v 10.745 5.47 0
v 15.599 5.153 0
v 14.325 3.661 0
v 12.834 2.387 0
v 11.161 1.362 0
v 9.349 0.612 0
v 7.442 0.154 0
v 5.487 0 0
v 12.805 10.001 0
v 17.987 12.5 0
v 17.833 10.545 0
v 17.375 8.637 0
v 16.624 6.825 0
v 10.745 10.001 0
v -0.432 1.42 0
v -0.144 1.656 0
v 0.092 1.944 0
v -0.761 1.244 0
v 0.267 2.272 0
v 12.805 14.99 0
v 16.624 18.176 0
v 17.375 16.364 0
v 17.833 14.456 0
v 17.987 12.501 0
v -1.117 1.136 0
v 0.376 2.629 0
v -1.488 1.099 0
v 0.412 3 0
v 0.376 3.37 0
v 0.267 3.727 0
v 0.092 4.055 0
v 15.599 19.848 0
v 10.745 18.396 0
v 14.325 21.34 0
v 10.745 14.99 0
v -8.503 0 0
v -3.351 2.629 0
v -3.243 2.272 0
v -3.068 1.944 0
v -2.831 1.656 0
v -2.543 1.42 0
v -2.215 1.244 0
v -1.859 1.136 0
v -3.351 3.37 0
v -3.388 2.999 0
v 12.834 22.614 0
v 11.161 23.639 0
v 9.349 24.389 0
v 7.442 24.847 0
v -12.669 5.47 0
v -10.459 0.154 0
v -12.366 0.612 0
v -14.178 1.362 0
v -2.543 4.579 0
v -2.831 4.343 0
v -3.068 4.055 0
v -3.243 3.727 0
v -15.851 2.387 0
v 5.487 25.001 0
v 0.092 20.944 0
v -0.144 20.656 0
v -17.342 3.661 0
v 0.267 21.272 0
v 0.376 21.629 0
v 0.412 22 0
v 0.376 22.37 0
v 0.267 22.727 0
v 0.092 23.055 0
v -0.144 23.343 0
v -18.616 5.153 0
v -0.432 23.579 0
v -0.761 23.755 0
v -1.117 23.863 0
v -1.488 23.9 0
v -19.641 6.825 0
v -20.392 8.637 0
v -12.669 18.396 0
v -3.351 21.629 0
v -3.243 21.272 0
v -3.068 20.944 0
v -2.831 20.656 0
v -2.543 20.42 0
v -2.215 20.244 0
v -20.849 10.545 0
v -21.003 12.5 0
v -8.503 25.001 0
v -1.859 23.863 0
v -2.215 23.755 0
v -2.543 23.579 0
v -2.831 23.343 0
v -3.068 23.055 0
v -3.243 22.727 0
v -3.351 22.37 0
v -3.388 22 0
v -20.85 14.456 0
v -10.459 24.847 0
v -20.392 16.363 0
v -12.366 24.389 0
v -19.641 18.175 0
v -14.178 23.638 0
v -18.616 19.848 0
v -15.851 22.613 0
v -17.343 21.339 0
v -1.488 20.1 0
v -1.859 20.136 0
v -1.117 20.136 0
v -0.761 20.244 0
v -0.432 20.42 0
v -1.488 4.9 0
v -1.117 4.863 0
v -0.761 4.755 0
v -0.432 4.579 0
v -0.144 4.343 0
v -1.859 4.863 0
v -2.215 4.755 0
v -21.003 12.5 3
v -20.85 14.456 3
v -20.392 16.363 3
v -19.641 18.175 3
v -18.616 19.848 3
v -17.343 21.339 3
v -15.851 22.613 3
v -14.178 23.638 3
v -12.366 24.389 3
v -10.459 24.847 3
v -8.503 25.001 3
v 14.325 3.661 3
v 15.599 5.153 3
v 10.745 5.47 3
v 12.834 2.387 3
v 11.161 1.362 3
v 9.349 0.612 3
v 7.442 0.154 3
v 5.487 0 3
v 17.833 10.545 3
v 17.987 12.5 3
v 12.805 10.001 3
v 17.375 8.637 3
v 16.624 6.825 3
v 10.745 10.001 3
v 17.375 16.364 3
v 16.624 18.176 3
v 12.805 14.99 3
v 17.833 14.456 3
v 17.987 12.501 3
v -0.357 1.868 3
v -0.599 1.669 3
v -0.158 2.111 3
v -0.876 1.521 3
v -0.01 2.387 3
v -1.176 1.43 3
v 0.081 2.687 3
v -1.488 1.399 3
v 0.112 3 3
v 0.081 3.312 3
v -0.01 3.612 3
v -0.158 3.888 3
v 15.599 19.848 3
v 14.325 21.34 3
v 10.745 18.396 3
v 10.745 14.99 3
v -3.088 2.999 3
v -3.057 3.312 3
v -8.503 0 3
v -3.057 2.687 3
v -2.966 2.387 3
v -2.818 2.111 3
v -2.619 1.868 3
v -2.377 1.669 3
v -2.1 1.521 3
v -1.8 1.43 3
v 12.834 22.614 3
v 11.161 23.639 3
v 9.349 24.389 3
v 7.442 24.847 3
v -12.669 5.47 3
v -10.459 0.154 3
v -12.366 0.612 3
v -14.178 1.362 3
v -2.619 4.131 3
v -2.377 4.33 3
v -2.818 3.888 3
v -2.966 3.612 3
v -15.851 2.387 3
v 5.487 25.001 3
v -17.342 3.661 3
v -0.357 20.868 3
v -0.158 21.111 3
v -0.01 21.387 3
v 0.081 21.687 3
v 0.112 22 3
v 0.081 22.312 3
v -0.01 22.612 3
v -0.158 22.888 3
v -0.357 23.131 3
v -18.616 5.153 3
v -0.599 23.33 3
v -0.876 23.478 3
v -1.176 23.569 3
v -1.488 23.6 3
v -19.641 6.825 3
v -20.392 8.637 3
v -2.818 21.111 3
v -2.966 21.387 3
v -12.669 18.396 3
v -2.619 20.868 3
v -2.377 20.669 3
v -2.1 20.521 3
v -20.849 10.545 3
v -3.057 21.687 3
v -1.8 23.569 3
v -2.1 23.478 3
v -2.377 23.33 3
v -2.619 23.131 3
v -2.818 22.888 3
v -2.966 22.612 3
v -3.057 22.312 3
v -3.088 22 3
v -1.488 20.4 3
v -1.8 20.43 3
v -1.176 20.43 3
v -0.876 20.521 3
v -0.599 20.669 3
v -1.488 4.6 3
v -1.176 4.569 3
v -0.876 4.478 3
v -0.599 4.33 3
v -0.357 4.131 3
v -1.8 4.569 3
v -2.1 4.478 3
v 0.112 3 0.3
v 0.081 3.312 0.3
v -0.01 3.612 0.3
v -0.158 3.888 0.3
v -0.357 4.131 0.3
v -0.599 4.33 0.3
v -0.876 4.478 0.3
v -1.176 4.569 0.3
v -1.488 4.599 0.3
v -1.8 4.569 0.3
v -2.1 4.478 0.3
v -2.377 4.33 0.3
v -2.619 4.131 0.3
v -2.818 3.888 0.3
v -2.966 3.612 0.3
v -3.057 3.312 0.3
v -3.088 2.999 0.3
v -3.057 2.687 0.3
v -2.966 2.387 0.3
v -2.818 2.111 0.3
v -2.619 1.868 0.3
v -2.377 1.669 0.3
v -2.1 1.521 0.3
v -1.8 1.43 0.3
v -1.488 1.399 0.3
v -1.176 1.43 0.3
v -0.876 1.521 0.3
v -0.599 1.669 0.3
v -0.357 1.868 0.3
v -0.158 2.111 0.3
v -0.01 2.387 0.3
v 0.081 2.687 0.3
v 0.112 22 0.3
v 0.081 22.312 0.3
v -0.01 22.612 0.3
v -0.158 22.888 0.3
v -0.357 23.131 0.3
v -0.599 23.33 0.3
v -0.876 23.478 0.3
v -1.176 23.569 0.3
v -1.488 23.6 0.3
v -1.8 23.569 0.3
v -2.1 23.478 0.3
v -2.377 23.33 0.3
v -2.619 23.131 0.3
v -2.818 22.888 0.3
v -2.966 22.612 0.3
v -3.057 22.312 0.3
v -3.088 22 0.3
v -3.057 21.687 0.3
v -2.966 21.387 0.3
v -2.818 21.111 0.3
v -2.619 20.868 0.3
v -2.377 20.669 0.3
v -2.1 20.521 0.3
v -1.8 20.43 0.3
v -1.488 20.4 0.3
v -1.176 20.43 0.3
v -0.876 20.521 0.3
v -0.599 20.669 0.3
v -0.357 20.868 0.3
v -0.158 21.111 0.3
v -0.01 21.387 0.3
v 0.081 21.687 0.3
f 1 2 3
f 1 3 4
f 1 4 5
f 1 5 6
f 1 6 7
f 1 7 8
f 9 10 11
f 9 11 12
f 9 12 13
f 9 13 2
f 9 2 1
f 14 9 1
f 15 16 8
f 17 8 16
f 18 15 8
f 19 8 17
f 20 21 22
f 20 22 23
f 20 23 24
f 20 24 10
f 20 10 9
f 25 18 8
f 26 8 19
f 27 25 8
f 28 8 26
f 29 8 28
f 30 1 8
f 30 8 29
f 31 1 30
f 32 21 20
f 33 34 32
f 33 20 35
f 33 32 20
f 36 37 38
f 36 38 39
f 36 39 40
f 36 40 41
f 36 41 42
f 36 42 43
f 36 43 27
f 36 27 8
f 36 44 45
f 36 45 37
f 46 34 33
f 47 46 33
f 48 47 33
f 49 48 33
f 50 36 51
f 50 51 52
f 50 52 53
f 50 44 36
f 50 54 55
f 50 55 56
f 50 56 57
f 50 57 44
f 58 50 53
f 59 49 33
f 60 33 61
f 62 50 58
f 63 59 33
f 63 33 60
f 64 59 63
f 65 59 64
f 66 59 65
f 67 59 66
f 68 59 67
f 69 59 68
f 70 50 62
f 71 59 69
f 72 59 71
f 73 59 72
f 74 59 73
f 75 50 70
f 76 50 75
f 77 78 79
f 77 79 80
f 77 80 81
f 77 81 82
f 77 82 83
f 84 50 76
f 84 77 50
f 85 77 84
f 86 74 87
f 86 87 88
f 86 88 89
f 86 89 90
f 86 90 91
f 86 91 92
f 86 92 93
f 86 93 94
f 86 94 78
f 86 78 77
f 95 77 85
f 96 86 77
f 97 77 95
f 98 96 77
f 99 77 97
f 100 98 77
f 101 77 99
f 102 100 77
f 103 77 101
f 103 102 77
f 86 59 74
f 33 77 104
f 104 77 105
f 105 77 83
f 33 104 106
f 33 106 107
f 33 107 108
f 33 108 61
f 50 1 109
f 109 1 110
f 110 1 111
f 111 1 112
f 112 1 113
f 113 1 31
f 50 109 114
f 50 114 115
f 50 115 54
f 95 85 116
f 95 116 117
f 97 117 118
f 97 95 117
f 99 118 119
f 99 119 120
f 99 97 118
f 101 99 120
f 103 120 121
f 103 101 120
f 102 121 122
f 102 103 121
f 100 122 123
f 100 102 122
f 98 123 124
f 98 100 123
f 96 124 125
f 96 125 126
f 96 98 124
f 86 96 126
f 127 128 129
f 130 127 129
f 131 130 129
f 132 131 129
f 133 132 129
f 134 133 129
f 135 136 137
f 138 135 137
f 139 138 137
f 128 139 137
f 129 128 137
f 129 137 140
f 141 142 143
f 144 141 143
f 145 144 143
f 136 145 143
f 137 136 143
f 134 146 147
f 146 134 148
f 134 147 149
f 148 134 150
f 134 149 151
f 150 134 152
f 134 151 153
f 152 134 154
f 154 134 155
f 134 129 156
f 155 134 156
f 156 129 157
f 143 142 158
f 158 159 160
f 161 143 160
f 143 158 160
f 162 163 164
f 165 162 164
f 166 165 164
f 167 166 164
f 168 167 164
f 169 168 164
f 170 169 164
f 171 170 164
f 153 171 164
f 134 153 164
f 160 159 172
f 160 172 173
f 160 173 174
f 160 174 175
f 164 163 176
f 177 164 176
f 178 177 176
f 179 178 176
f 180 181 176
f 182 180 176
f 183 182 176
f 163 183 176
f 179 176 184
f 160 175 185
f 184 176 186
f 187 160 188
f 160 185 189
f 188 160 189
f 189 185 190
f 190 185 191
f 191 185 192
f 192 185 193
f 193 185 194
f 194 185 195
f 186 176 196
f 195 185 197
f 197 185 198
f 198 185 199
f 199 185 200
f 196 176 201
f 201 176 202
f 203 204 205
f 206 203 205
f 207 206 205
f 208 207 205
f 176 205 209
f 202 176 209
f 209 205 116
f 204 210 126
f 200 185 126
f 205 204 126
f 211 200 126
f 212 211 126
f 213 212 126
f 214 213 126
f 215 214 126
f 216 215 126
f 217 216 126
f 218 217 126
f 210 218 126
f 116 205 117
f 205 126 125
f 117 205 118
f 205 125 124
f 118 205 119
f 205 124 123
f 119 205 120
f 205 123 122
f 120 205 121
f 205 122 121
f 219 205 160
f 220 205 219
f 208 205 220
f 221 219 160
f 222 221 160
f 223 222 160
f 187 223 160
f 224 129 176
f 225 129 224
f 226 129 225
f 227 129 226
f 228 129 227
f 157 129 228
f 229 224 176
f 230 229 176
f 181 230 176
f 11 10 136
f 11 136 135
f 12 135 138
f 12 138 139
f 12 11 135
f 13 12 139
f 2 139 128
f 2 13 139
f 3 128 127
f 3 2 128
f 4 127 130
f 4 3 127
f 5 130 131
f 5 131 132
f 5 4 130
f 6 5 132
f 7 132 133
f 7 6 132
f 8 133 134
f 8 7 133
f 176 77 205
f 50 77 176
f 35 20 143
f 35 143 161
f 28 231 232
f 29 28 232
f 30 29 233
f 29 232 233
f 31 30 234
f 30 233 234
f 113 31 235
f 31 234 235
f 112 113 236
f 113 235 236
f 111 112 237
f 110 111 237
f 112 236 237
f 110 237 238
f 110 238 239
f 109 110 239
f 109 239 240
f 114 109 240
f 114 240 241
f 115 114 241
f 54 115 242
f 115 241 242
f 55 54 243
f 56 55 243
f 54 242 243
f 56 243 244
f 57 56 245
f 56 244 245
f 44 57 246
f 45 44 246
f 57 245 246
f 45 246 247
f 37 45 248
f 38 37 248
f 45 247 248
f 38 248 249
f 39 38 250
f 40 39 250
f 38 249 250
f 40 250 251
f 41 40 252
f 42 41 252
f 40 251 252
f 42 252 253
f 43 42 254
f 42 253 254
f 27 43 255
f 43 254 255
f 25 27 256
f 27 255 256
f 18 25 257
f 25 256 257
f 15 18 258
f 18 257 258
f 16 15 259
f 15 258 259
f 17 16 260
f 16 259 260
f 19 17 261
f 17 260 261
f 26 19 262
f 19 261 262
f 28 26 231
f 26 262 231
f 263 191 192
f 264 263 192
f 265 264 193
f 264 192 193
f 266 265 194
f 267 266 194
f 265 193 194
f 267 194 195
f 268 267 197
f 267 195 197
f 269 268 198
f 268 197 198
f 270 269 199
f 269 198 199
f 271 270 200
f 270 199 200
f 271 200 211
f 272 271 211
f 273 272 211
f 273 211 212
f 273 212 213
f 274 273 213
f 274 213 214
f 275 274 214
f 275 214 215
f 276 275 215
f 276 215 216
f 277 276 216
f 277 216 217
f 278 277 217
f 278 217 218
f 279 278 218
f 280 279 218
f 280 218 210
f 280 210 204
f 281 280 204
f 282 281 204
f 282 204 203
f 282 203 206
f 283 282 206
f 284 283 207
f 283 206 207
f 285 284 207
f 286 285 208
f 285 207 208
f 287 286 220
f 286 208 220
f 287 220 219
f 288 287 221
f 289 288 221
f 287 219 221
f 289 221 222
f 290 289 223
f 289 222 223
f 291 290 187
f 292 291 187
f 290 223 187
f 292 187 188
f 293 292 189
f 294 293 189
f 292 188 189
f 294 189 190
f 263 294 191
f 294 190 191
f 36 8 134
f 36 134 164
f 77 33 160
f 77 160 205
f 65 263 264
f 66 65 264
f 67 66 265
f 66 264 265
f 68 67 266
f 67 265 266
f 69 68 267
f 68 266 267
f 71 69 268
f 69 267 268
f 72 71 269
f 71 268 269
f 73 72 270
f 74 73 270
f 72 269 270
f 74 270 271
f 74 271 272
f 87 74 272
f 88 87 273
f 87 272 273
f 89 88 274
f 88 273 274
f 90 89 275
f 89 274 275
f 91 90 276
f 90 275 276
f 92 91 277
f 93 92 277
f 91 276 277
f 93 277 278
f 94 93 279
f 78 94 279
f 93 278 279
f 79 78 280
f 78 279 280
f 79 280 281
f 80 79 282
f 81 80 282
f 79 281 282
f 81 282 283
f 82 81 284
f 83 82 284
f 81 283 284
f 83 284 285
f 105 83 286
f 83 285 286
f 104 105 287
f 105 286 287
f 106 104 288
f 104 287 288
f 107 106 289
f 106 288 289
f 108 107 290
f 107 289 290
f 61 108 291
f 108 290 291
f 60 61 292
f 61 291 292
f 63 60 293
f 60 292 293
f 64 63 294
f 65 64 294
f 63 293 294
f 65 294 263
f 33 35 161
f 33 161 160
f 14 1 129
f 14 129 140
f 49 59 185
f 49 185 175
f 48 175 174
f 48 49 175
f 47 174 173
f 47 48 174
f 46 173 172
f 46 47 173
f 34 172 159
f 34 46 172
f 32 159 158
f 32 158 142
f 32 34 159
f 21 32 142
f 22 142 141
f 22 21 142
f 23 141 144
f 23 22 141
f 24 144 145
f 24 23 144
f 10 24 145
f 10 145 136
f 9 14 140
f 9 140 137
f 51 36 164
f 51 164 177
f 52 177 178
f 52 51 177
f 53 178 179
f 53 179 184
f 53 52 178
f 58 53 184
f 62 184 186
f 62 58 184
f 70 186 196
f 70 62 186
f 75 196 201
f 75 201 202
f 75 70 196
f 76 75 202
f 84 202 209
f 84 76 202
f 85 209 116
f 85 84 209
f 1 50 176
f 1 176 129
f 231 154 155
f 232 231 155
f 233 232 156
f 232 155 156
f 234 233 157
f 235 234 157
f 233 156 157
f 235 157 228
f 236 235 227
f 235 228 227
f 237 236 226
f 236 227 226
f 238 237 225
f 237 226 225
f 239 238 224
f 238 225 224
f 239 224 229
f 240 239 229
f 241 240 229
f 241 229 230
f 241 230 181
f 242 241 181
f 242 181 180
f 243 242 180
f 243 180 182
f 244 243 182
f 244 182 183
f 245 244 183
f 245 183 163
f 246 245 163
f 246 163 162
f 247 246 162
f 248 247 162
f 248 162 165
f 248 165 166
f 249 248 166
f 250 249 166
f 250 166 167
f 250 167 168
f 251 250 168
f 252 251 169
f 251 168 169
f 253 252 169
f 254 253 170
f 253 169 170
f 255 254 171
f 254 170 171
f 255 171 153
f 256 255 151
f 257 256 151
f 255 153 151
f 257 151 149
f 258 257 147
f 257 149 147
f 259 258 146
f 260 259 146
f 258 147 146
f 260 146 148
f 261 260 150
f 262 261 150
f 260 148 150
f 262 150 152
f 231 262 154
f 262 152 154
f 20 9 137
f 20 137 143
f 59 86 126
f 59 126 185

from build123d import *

# Parameters (mm, degrees)
SKETCH_1_R          = 1.3
EXTRUDE_1_DEPTH     = 3
SKETCH_2_R          = 1.6
CUT_EXTRUDE_1_DEPTH = 33.790082592
CHAMFER_1_SIZE      = 0.3


with BuildPart() as part:
    # 草图1 → 凸台-拉伸1 (new body)
    with BuildSketch(Plane(origin=(0, 0, 0), x_dir=(-1, 0, 0), z_dir=(0, 0, -1))):
        with BuildLine():
            Line((8.503321513, 25.001), (-5.486589193, 25.001))
            ThreePointArc((-5.486589193, 25.001), (-14.325423958, 21.339834765), (-17.986589193, 12.501))
            Line((-17.986589193, 12.501), (-17.986589193, 12.5))
            ThreePointArc((-17.986589193, 12.5), (-14.325423958, 3.661165235), (-5.486589193, 0))
            Line((-5.486589193, 0), (8.503321493, 0))
            ThreePointArc((8.503321493, 0), (17.342156257, 3.661165235), (21.003321493, 12.5))
            ThreePointArc((21.003321493, 12.5), (17.342509831, 21.339481206), (8.503321513, 25.001))
        make_face()
        with Locations(Location((1.487905971, 21.9995, 0), (0, 0, 180))):
            Circle(SKETCH_1_R, mode=Mode.SUBTRACT)
        with Locations(Location((1.487905971, 2.9995, 0), (0, 0, 180))):
            Circle(SKETCH_1_R, mode=Mode.SUBTRACT)
        Polygon((-12.805414109, 14.989684765), (-10.744590409, 14.989684765), (-10.744590409, 18.396106406), (12.668734206, 18.396106406), (12.668734206, 5.470232129), (-10.744590409, 5.470232129), (-10.744590409, 10.001), (-12.805414109, 10.001), align=None, mode=Mode.SUBTRACT)
    extrude(amount=-EXTRUDE_1_DEPTH)

    # 草图2 → 切除-拉伸1 (cut, through all)
    with BuildSketch(Plane.XY.offset(3)):
        with Locations((-1.487905971, 21.9995)):
            Circle(SKETCH_2_R)
        with Locations((-1.487905971, 2.9995)):
            Circle(SKETCH_2_R)
    extrude(amount=-CUT_EXTRUDE_1_DEPTH, mode=Mode.SUBTRACT)

    # 倒角1
    chamfer_1_edges = [part.edges().sort_by_distance(p)[0] for p in [
        (-3.087905971, 21.9995, 0),
        (-3.087905971, 2.9995, 0),
    ]]
    chamfer(chamfer_1_edges, length=CHAMFER_1_SIZE)


solid = part.part
